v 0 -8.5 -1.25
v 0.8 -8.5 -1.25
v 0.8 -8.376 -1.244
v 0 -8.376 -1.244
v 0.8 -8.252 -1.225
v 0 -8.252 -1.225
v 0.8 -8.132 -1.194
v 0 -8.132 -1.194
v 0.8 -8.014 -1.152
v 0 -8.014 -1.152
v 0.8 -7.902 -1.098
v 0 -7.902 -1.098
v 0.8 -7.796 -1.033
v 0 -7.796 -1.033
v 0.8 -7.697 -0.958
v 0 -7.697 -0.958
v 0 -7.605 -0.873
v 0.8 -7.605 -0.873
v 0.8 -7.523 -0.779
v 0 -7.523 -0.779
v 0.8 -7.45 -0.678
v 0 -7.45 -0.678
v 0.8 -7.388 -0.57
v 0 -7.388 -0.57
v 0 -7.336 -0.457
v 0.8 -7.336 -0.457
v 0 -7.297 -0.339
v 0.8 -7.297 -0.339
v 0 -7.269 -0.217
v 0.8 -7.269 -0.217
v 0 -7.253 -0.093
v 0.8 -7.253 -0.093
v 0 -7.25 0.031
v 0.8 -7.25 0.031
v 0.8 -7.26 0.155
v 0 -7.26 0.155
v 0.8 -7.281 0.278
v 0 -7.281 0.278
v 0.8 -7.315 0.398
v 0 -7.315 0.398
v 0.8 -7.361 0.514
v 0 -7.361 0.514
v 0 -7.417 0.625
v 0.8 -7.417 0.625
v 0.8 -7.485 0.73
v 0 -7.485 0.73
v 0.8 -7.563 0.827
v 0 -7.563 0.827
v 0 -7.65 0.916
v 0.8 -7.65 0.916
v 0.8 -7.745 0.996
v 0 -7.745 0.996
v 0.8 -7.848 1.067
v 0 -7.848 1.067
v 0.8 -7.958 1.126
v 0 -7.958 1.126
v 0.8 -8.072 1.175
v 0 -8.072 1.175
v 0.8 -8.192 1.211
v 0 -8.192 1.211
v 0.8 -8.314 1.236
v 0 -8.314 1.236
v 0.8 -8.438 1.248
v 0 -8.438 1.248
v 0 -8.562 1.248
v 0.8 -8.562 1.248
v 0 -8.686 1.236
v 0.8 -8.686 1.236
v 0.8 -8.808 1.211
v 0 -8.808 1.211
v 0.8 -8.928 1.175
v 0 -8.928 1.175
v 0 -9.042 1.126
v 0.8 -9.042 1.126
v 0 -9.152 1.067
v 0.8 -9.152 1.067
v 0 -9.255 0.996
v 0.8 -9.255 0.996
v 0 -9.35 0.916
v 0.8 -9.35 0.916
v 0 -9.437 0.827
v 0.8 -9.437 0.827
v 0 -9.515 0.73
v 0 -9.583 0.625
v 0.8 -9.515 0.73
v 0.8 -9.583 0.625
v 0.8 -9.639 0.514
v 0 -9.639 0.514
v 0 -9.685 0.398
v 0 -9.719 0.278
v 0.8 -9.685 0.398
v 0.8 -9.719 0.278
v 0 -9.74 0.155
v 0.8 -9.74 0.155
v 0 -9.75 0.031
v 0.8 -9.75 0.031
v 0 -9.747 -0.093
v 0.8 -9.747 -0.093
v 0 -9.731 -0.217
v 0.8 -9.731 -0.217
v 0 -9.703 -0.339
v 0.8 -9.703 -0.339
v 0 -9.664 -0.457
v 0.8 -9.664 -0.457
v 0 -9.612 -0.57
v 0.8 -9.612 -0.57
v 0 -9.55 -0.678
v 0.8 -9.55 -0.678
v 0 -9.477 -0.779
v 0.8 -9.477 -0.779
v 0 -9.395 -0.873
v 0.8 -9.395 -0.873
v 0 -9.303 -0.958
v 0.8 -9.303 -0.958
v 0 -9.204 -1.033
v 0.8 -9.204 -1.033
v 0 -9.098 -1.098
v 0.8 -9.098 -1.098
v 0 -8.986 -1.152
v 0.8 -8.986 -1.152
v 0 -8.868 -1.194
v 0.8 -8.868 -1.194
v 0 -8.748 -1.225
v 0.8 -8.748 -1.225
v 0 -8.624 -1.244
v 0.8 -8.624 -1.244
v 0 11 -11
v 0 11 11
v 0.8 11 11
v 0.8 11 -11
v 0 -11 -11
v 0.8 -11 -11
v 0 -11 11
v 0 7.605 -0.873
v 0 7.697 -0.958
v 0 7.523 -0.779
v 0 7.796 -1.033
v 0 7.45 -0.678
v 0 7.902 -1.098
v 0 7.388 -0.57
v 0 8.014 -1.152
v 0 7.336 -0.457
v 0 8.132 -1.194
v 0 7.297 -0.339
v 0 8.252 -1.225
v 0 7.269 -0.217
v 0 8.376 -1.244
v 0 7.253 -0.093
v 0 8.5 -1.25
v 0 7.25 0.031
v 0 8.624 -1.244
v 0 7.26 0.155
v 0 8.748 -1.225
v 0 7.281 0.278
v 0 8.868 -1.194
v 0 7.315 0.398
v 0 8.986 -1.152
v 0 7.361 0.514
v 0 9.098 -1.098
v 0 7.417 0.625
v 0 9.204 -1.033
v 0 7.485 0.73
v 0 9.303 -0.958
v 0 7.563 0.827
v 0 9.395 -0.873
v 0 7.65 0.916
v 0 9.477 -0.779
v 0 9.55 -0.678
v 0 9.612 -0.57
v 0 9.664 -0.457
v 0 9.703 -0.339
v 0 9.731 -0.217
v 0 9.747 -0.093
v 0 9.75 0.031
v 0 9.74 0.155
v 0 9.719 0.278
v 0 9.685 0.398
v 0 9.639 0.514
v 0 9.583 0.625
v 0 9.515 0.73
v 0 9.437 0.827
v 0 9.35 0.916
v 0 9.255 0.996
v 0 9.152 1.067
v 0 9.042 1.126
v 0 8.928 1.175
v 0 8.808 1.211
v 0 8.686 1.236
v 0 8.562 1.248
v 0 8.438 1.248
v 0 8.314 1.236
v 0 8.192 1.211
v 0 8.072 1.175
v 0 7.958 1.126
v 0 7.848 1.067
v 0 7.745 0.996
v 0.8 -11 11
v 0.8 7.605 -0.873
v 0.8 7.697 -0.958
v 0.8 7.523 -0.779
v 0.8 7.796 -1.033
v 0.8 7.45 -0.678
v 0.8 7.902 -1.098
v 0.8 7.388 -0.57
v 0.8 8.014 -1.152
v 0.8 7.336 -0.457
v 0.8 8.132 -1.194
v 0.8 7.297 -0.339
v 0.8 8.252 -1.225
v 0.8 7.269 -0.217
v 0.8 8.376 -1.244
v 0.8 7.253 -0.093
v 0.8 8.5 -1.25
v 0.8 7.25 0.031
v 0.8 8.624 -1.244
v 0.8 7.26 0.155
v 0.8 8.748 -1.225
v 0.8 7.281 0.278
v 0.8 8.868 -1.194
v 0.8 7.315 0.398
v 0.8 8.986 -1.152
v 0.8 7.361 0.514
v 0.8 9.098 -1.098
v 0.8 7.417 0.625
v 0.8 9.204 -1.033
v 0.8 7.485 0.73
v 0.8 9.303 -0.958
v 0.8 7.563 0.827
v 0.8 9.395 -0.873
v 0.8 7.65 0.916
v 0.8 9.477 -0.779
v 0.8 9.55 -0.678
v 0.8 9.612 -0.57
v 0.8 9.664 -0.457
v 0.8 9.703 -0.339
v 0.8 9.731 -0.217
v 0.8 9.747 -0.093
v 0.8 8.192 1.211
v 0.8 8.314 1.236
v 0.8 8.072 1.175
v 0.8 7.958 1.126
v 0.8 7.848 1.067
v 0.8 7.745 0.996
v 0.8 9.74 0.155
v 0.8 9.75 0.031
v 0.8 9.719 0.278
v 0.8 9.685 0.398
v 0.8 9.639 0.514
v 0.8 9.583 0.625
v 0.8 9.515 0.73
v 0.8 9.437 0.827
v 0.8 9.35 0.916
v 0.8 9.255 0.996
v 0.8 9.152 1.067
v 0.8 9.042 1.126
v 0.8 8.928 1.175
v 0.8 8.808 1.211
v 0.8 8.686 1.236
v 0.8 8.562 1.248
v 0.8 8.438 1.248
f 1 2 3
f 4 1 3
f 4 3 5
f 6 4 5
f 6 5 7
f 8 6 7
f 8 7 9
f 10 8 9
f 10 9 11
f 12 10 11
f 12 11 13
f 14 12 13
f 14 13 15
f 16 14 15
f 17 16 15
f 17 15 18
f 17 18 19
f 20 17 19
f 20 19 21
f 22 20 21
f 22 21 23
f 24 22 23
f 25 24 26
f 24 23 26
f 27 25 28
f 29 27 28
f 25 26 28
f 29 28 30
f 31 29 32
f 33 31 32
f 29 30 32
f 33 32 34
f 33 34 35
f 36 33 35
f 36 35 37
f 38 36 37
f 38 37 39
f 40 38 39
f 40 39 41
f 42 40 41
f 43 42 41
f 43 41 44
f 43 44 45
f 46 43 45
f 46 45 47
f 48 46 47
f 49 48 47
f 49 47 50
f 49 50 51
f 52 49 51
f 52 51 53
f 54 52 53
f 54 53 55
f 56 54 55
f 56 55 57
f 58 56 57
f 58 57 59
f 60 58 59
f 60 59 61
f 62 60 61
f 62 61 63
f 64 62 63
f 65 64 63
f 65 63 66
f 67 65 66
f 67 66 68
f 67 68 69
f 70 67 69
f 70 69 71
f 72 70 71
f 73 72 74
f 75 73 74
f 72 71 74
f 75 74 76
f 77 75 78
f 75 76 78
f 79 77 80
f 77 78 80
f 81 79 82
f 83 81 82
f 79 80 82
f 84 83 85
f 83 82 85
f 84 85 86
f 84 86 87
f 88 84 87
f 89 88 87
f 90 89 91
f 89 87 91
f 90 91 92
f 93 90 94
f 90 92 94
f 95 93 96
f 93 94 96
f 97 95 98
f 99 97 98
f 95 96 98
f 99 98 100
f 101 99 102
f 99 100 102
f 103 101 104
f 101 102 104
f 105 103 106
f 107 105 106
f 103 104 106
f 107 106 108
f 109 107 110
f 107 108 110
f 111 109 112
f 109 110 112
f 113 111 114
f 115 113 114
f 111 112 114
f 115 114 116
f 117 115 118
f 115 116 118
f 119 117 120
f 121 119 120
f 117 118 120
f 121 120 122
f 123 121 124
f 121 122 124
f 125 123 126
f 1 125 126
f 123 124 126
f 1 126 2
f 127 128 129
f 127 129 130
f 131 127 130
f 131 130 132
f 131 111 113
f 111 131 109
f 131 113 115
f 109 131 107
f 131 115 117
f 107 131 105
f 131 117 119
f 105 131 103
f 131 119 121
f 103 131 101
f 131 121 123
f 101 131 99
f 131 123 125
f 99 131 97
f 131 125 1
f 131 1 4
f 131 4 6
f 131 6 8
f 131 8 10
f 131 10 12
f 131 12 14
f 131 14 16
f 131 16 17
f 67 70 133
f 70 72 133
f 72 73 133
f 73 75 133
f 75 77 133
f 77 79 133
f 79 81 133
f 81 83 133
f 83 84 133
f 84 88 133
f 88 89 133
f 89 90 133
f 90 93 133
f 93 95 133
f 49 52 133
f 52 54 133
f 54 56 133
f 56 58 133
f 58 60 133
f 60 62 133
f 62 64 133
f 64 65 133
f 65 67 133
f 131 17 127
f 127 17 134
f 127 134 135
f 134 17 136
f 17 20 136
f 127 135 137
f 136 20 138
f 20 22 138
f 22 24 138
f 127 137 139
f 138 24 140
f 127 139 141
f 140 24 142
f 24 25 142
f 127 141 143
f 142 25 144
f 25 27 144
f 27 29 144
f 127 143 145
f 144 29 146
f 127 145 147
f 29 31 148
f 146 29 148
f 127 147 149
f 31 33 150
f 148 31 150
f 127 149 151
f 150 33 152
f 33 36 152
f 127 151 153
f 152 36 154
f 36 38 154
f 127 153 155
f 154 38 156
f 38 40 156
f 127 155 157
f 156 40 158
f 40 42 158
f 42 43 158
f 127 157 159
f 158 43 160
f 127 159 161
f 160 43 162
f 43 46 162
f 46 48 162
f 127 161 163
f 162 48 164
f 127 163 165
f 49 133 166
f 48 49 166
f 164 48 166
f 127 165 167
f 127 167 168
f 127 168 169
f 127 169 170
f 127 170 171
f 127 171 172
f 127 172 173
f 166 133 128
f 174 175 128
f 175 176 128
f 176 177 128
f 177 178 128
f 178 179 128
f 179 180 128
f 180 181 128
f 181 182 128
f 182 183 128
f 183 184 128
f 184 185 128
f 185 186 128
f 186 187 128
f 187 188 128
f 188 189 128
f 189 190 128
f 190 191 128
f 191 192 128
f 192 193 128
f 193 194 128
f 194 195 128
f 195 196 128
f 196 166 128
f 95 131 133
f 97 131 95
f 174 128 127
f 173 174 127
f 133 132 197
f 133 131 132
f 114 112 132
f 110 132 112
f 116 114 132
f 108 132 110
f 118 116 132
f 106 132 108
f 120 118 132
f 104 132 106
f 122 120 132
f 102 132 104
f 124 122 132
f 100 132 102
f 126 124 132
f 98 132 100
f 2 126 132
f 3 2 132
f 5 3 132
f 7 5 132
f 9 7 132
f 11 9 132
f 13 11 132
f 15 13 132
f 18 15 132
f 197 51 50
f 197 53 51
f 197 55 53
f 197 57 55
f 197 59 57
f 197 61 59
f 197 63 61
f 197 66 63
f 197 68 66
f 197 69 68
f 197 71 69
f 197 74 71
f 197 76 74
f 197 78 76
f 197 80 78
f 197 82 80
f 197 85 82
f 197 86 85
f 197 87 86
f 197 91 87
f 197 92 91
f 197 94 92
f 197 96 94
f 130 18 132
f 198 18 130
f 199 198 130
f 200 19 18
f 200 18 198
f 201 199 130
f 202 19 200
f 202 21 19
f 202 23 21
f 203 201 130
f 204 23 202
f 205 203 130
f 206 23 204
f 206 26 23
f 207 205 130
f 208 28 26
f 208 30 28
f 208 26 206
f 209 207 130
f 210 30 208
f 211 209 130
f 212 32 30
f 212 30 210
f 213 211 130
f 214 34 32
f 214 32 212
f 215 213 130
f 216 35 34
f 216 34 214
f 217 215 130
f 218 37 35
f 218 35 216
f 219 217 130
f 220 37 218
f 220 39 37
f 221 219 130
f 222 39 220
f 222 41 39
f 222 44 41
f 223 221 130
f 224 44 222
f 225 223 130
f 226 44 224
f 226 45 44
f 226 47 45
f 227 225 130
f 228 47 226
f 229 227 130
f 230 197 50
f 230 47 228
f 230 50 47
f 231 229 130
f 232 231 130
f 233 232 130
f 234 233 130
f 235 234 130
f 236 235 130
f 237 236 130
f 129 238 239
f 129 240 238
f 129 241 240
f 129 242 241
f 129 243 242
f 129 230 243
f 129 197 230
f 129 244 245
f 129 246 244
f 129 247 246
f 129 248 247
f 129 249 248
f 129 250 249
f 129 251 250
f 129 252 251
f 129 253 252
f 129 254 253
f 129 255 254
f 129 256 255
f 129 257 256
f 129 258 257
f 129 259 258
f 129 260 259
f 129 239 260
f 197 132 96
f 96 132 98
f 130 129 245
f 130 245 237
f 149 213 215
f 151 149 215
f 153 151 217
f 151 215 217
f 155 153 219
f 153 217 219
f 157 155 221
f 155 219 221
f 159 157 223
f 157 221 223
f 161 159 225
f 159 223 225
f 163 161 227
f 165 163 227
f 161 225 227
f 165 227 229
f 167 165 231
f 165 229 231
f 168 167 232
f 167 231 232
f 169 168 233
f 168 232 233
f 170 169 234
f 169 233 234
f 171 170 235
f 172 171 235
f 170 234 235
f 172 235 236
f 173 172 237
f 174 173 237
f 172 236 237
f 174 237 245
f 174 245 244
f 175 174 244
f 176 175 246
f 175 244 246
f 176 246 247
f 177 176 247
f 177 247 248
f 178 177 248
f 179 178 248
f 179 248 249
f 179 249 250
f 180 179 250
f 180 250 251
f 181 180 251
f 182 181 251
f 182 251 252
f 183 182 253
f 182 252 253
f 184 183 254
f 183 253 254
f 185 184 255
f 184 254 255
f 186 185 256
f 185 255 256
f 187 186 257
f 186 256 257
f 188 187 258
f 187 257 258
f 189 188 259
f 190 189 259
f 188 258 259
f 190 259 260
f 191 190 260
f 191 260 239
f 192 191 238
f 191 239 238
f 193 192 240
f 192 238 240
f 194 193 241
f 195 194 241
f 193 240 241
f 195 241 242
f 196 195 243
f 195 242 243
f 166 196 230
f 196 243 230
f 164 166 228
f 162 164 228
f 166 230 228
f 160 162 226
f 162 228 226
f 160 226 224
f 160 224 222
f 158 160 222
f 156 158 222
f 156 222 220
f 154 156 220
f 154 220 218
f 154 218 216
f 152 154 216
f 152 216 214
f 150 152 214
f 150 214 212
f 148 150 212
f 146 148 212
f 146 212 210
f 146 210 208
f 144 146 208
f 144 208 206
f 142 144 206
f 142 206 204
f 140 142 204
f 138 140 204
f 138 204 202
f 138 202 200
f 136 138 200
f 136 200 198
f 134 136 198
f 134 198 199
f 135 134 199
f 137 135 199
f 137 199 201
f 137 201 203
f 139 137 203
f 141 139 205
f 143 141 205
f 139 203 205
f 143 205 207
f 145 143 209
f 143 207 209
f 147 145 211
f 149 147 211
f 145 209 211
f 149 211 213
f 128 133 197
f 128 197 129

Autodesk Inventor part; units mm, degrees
ref_plane "YZ Plane" through (0, 0, 0) normal (1, 0, 0) x (0, 1, 0)
ref_plane "XZ Plane" through (0, 0, 0) normal (0, 1, 0) x (-1, 0, 0)
ref_plane "XY Plane" through (0, 0, 0) normal (0, 0, 1) x (1, 0, 0)
sketch "Sketch1" plane through (0, 0, 0) normal (1, 0, 0) x (0, 1, 0)
  line L0 (-11, 11) -> (11, 11)
  line L1 (11, 11) -> (11, -11)
  line L2 (11, -11) -> (-11, -11)
  line L3 (-11, -11) -> (-11, 11)
  point P0 (0, 0)
  dimension "d0" = 22
  dimension "d1" = 22
  dimension "d2" = 11
  dimension "d3" = 11
extrude "Extrusion1" add sketch "Sketch1" along normal blind 0.8
sketch "Sketch2" plane through (0.8, 0, 0) normal (1, 0, 0) x (0, 0, -1)
  circle A0 centre (0, -8.5) radius 1.25
  circle A1 centre (0, 8.5) radius 1.25
  point P0 (0, 0)
  dimension "d6" = 2.5
  dimension "d7" = 2.5
  dimension "d8" = 8.5
  dimension "d9" = 8.5
extrude "Extrusion2" cut sketch "Sketch2" against normal blind 10
properties part number "PCB"
